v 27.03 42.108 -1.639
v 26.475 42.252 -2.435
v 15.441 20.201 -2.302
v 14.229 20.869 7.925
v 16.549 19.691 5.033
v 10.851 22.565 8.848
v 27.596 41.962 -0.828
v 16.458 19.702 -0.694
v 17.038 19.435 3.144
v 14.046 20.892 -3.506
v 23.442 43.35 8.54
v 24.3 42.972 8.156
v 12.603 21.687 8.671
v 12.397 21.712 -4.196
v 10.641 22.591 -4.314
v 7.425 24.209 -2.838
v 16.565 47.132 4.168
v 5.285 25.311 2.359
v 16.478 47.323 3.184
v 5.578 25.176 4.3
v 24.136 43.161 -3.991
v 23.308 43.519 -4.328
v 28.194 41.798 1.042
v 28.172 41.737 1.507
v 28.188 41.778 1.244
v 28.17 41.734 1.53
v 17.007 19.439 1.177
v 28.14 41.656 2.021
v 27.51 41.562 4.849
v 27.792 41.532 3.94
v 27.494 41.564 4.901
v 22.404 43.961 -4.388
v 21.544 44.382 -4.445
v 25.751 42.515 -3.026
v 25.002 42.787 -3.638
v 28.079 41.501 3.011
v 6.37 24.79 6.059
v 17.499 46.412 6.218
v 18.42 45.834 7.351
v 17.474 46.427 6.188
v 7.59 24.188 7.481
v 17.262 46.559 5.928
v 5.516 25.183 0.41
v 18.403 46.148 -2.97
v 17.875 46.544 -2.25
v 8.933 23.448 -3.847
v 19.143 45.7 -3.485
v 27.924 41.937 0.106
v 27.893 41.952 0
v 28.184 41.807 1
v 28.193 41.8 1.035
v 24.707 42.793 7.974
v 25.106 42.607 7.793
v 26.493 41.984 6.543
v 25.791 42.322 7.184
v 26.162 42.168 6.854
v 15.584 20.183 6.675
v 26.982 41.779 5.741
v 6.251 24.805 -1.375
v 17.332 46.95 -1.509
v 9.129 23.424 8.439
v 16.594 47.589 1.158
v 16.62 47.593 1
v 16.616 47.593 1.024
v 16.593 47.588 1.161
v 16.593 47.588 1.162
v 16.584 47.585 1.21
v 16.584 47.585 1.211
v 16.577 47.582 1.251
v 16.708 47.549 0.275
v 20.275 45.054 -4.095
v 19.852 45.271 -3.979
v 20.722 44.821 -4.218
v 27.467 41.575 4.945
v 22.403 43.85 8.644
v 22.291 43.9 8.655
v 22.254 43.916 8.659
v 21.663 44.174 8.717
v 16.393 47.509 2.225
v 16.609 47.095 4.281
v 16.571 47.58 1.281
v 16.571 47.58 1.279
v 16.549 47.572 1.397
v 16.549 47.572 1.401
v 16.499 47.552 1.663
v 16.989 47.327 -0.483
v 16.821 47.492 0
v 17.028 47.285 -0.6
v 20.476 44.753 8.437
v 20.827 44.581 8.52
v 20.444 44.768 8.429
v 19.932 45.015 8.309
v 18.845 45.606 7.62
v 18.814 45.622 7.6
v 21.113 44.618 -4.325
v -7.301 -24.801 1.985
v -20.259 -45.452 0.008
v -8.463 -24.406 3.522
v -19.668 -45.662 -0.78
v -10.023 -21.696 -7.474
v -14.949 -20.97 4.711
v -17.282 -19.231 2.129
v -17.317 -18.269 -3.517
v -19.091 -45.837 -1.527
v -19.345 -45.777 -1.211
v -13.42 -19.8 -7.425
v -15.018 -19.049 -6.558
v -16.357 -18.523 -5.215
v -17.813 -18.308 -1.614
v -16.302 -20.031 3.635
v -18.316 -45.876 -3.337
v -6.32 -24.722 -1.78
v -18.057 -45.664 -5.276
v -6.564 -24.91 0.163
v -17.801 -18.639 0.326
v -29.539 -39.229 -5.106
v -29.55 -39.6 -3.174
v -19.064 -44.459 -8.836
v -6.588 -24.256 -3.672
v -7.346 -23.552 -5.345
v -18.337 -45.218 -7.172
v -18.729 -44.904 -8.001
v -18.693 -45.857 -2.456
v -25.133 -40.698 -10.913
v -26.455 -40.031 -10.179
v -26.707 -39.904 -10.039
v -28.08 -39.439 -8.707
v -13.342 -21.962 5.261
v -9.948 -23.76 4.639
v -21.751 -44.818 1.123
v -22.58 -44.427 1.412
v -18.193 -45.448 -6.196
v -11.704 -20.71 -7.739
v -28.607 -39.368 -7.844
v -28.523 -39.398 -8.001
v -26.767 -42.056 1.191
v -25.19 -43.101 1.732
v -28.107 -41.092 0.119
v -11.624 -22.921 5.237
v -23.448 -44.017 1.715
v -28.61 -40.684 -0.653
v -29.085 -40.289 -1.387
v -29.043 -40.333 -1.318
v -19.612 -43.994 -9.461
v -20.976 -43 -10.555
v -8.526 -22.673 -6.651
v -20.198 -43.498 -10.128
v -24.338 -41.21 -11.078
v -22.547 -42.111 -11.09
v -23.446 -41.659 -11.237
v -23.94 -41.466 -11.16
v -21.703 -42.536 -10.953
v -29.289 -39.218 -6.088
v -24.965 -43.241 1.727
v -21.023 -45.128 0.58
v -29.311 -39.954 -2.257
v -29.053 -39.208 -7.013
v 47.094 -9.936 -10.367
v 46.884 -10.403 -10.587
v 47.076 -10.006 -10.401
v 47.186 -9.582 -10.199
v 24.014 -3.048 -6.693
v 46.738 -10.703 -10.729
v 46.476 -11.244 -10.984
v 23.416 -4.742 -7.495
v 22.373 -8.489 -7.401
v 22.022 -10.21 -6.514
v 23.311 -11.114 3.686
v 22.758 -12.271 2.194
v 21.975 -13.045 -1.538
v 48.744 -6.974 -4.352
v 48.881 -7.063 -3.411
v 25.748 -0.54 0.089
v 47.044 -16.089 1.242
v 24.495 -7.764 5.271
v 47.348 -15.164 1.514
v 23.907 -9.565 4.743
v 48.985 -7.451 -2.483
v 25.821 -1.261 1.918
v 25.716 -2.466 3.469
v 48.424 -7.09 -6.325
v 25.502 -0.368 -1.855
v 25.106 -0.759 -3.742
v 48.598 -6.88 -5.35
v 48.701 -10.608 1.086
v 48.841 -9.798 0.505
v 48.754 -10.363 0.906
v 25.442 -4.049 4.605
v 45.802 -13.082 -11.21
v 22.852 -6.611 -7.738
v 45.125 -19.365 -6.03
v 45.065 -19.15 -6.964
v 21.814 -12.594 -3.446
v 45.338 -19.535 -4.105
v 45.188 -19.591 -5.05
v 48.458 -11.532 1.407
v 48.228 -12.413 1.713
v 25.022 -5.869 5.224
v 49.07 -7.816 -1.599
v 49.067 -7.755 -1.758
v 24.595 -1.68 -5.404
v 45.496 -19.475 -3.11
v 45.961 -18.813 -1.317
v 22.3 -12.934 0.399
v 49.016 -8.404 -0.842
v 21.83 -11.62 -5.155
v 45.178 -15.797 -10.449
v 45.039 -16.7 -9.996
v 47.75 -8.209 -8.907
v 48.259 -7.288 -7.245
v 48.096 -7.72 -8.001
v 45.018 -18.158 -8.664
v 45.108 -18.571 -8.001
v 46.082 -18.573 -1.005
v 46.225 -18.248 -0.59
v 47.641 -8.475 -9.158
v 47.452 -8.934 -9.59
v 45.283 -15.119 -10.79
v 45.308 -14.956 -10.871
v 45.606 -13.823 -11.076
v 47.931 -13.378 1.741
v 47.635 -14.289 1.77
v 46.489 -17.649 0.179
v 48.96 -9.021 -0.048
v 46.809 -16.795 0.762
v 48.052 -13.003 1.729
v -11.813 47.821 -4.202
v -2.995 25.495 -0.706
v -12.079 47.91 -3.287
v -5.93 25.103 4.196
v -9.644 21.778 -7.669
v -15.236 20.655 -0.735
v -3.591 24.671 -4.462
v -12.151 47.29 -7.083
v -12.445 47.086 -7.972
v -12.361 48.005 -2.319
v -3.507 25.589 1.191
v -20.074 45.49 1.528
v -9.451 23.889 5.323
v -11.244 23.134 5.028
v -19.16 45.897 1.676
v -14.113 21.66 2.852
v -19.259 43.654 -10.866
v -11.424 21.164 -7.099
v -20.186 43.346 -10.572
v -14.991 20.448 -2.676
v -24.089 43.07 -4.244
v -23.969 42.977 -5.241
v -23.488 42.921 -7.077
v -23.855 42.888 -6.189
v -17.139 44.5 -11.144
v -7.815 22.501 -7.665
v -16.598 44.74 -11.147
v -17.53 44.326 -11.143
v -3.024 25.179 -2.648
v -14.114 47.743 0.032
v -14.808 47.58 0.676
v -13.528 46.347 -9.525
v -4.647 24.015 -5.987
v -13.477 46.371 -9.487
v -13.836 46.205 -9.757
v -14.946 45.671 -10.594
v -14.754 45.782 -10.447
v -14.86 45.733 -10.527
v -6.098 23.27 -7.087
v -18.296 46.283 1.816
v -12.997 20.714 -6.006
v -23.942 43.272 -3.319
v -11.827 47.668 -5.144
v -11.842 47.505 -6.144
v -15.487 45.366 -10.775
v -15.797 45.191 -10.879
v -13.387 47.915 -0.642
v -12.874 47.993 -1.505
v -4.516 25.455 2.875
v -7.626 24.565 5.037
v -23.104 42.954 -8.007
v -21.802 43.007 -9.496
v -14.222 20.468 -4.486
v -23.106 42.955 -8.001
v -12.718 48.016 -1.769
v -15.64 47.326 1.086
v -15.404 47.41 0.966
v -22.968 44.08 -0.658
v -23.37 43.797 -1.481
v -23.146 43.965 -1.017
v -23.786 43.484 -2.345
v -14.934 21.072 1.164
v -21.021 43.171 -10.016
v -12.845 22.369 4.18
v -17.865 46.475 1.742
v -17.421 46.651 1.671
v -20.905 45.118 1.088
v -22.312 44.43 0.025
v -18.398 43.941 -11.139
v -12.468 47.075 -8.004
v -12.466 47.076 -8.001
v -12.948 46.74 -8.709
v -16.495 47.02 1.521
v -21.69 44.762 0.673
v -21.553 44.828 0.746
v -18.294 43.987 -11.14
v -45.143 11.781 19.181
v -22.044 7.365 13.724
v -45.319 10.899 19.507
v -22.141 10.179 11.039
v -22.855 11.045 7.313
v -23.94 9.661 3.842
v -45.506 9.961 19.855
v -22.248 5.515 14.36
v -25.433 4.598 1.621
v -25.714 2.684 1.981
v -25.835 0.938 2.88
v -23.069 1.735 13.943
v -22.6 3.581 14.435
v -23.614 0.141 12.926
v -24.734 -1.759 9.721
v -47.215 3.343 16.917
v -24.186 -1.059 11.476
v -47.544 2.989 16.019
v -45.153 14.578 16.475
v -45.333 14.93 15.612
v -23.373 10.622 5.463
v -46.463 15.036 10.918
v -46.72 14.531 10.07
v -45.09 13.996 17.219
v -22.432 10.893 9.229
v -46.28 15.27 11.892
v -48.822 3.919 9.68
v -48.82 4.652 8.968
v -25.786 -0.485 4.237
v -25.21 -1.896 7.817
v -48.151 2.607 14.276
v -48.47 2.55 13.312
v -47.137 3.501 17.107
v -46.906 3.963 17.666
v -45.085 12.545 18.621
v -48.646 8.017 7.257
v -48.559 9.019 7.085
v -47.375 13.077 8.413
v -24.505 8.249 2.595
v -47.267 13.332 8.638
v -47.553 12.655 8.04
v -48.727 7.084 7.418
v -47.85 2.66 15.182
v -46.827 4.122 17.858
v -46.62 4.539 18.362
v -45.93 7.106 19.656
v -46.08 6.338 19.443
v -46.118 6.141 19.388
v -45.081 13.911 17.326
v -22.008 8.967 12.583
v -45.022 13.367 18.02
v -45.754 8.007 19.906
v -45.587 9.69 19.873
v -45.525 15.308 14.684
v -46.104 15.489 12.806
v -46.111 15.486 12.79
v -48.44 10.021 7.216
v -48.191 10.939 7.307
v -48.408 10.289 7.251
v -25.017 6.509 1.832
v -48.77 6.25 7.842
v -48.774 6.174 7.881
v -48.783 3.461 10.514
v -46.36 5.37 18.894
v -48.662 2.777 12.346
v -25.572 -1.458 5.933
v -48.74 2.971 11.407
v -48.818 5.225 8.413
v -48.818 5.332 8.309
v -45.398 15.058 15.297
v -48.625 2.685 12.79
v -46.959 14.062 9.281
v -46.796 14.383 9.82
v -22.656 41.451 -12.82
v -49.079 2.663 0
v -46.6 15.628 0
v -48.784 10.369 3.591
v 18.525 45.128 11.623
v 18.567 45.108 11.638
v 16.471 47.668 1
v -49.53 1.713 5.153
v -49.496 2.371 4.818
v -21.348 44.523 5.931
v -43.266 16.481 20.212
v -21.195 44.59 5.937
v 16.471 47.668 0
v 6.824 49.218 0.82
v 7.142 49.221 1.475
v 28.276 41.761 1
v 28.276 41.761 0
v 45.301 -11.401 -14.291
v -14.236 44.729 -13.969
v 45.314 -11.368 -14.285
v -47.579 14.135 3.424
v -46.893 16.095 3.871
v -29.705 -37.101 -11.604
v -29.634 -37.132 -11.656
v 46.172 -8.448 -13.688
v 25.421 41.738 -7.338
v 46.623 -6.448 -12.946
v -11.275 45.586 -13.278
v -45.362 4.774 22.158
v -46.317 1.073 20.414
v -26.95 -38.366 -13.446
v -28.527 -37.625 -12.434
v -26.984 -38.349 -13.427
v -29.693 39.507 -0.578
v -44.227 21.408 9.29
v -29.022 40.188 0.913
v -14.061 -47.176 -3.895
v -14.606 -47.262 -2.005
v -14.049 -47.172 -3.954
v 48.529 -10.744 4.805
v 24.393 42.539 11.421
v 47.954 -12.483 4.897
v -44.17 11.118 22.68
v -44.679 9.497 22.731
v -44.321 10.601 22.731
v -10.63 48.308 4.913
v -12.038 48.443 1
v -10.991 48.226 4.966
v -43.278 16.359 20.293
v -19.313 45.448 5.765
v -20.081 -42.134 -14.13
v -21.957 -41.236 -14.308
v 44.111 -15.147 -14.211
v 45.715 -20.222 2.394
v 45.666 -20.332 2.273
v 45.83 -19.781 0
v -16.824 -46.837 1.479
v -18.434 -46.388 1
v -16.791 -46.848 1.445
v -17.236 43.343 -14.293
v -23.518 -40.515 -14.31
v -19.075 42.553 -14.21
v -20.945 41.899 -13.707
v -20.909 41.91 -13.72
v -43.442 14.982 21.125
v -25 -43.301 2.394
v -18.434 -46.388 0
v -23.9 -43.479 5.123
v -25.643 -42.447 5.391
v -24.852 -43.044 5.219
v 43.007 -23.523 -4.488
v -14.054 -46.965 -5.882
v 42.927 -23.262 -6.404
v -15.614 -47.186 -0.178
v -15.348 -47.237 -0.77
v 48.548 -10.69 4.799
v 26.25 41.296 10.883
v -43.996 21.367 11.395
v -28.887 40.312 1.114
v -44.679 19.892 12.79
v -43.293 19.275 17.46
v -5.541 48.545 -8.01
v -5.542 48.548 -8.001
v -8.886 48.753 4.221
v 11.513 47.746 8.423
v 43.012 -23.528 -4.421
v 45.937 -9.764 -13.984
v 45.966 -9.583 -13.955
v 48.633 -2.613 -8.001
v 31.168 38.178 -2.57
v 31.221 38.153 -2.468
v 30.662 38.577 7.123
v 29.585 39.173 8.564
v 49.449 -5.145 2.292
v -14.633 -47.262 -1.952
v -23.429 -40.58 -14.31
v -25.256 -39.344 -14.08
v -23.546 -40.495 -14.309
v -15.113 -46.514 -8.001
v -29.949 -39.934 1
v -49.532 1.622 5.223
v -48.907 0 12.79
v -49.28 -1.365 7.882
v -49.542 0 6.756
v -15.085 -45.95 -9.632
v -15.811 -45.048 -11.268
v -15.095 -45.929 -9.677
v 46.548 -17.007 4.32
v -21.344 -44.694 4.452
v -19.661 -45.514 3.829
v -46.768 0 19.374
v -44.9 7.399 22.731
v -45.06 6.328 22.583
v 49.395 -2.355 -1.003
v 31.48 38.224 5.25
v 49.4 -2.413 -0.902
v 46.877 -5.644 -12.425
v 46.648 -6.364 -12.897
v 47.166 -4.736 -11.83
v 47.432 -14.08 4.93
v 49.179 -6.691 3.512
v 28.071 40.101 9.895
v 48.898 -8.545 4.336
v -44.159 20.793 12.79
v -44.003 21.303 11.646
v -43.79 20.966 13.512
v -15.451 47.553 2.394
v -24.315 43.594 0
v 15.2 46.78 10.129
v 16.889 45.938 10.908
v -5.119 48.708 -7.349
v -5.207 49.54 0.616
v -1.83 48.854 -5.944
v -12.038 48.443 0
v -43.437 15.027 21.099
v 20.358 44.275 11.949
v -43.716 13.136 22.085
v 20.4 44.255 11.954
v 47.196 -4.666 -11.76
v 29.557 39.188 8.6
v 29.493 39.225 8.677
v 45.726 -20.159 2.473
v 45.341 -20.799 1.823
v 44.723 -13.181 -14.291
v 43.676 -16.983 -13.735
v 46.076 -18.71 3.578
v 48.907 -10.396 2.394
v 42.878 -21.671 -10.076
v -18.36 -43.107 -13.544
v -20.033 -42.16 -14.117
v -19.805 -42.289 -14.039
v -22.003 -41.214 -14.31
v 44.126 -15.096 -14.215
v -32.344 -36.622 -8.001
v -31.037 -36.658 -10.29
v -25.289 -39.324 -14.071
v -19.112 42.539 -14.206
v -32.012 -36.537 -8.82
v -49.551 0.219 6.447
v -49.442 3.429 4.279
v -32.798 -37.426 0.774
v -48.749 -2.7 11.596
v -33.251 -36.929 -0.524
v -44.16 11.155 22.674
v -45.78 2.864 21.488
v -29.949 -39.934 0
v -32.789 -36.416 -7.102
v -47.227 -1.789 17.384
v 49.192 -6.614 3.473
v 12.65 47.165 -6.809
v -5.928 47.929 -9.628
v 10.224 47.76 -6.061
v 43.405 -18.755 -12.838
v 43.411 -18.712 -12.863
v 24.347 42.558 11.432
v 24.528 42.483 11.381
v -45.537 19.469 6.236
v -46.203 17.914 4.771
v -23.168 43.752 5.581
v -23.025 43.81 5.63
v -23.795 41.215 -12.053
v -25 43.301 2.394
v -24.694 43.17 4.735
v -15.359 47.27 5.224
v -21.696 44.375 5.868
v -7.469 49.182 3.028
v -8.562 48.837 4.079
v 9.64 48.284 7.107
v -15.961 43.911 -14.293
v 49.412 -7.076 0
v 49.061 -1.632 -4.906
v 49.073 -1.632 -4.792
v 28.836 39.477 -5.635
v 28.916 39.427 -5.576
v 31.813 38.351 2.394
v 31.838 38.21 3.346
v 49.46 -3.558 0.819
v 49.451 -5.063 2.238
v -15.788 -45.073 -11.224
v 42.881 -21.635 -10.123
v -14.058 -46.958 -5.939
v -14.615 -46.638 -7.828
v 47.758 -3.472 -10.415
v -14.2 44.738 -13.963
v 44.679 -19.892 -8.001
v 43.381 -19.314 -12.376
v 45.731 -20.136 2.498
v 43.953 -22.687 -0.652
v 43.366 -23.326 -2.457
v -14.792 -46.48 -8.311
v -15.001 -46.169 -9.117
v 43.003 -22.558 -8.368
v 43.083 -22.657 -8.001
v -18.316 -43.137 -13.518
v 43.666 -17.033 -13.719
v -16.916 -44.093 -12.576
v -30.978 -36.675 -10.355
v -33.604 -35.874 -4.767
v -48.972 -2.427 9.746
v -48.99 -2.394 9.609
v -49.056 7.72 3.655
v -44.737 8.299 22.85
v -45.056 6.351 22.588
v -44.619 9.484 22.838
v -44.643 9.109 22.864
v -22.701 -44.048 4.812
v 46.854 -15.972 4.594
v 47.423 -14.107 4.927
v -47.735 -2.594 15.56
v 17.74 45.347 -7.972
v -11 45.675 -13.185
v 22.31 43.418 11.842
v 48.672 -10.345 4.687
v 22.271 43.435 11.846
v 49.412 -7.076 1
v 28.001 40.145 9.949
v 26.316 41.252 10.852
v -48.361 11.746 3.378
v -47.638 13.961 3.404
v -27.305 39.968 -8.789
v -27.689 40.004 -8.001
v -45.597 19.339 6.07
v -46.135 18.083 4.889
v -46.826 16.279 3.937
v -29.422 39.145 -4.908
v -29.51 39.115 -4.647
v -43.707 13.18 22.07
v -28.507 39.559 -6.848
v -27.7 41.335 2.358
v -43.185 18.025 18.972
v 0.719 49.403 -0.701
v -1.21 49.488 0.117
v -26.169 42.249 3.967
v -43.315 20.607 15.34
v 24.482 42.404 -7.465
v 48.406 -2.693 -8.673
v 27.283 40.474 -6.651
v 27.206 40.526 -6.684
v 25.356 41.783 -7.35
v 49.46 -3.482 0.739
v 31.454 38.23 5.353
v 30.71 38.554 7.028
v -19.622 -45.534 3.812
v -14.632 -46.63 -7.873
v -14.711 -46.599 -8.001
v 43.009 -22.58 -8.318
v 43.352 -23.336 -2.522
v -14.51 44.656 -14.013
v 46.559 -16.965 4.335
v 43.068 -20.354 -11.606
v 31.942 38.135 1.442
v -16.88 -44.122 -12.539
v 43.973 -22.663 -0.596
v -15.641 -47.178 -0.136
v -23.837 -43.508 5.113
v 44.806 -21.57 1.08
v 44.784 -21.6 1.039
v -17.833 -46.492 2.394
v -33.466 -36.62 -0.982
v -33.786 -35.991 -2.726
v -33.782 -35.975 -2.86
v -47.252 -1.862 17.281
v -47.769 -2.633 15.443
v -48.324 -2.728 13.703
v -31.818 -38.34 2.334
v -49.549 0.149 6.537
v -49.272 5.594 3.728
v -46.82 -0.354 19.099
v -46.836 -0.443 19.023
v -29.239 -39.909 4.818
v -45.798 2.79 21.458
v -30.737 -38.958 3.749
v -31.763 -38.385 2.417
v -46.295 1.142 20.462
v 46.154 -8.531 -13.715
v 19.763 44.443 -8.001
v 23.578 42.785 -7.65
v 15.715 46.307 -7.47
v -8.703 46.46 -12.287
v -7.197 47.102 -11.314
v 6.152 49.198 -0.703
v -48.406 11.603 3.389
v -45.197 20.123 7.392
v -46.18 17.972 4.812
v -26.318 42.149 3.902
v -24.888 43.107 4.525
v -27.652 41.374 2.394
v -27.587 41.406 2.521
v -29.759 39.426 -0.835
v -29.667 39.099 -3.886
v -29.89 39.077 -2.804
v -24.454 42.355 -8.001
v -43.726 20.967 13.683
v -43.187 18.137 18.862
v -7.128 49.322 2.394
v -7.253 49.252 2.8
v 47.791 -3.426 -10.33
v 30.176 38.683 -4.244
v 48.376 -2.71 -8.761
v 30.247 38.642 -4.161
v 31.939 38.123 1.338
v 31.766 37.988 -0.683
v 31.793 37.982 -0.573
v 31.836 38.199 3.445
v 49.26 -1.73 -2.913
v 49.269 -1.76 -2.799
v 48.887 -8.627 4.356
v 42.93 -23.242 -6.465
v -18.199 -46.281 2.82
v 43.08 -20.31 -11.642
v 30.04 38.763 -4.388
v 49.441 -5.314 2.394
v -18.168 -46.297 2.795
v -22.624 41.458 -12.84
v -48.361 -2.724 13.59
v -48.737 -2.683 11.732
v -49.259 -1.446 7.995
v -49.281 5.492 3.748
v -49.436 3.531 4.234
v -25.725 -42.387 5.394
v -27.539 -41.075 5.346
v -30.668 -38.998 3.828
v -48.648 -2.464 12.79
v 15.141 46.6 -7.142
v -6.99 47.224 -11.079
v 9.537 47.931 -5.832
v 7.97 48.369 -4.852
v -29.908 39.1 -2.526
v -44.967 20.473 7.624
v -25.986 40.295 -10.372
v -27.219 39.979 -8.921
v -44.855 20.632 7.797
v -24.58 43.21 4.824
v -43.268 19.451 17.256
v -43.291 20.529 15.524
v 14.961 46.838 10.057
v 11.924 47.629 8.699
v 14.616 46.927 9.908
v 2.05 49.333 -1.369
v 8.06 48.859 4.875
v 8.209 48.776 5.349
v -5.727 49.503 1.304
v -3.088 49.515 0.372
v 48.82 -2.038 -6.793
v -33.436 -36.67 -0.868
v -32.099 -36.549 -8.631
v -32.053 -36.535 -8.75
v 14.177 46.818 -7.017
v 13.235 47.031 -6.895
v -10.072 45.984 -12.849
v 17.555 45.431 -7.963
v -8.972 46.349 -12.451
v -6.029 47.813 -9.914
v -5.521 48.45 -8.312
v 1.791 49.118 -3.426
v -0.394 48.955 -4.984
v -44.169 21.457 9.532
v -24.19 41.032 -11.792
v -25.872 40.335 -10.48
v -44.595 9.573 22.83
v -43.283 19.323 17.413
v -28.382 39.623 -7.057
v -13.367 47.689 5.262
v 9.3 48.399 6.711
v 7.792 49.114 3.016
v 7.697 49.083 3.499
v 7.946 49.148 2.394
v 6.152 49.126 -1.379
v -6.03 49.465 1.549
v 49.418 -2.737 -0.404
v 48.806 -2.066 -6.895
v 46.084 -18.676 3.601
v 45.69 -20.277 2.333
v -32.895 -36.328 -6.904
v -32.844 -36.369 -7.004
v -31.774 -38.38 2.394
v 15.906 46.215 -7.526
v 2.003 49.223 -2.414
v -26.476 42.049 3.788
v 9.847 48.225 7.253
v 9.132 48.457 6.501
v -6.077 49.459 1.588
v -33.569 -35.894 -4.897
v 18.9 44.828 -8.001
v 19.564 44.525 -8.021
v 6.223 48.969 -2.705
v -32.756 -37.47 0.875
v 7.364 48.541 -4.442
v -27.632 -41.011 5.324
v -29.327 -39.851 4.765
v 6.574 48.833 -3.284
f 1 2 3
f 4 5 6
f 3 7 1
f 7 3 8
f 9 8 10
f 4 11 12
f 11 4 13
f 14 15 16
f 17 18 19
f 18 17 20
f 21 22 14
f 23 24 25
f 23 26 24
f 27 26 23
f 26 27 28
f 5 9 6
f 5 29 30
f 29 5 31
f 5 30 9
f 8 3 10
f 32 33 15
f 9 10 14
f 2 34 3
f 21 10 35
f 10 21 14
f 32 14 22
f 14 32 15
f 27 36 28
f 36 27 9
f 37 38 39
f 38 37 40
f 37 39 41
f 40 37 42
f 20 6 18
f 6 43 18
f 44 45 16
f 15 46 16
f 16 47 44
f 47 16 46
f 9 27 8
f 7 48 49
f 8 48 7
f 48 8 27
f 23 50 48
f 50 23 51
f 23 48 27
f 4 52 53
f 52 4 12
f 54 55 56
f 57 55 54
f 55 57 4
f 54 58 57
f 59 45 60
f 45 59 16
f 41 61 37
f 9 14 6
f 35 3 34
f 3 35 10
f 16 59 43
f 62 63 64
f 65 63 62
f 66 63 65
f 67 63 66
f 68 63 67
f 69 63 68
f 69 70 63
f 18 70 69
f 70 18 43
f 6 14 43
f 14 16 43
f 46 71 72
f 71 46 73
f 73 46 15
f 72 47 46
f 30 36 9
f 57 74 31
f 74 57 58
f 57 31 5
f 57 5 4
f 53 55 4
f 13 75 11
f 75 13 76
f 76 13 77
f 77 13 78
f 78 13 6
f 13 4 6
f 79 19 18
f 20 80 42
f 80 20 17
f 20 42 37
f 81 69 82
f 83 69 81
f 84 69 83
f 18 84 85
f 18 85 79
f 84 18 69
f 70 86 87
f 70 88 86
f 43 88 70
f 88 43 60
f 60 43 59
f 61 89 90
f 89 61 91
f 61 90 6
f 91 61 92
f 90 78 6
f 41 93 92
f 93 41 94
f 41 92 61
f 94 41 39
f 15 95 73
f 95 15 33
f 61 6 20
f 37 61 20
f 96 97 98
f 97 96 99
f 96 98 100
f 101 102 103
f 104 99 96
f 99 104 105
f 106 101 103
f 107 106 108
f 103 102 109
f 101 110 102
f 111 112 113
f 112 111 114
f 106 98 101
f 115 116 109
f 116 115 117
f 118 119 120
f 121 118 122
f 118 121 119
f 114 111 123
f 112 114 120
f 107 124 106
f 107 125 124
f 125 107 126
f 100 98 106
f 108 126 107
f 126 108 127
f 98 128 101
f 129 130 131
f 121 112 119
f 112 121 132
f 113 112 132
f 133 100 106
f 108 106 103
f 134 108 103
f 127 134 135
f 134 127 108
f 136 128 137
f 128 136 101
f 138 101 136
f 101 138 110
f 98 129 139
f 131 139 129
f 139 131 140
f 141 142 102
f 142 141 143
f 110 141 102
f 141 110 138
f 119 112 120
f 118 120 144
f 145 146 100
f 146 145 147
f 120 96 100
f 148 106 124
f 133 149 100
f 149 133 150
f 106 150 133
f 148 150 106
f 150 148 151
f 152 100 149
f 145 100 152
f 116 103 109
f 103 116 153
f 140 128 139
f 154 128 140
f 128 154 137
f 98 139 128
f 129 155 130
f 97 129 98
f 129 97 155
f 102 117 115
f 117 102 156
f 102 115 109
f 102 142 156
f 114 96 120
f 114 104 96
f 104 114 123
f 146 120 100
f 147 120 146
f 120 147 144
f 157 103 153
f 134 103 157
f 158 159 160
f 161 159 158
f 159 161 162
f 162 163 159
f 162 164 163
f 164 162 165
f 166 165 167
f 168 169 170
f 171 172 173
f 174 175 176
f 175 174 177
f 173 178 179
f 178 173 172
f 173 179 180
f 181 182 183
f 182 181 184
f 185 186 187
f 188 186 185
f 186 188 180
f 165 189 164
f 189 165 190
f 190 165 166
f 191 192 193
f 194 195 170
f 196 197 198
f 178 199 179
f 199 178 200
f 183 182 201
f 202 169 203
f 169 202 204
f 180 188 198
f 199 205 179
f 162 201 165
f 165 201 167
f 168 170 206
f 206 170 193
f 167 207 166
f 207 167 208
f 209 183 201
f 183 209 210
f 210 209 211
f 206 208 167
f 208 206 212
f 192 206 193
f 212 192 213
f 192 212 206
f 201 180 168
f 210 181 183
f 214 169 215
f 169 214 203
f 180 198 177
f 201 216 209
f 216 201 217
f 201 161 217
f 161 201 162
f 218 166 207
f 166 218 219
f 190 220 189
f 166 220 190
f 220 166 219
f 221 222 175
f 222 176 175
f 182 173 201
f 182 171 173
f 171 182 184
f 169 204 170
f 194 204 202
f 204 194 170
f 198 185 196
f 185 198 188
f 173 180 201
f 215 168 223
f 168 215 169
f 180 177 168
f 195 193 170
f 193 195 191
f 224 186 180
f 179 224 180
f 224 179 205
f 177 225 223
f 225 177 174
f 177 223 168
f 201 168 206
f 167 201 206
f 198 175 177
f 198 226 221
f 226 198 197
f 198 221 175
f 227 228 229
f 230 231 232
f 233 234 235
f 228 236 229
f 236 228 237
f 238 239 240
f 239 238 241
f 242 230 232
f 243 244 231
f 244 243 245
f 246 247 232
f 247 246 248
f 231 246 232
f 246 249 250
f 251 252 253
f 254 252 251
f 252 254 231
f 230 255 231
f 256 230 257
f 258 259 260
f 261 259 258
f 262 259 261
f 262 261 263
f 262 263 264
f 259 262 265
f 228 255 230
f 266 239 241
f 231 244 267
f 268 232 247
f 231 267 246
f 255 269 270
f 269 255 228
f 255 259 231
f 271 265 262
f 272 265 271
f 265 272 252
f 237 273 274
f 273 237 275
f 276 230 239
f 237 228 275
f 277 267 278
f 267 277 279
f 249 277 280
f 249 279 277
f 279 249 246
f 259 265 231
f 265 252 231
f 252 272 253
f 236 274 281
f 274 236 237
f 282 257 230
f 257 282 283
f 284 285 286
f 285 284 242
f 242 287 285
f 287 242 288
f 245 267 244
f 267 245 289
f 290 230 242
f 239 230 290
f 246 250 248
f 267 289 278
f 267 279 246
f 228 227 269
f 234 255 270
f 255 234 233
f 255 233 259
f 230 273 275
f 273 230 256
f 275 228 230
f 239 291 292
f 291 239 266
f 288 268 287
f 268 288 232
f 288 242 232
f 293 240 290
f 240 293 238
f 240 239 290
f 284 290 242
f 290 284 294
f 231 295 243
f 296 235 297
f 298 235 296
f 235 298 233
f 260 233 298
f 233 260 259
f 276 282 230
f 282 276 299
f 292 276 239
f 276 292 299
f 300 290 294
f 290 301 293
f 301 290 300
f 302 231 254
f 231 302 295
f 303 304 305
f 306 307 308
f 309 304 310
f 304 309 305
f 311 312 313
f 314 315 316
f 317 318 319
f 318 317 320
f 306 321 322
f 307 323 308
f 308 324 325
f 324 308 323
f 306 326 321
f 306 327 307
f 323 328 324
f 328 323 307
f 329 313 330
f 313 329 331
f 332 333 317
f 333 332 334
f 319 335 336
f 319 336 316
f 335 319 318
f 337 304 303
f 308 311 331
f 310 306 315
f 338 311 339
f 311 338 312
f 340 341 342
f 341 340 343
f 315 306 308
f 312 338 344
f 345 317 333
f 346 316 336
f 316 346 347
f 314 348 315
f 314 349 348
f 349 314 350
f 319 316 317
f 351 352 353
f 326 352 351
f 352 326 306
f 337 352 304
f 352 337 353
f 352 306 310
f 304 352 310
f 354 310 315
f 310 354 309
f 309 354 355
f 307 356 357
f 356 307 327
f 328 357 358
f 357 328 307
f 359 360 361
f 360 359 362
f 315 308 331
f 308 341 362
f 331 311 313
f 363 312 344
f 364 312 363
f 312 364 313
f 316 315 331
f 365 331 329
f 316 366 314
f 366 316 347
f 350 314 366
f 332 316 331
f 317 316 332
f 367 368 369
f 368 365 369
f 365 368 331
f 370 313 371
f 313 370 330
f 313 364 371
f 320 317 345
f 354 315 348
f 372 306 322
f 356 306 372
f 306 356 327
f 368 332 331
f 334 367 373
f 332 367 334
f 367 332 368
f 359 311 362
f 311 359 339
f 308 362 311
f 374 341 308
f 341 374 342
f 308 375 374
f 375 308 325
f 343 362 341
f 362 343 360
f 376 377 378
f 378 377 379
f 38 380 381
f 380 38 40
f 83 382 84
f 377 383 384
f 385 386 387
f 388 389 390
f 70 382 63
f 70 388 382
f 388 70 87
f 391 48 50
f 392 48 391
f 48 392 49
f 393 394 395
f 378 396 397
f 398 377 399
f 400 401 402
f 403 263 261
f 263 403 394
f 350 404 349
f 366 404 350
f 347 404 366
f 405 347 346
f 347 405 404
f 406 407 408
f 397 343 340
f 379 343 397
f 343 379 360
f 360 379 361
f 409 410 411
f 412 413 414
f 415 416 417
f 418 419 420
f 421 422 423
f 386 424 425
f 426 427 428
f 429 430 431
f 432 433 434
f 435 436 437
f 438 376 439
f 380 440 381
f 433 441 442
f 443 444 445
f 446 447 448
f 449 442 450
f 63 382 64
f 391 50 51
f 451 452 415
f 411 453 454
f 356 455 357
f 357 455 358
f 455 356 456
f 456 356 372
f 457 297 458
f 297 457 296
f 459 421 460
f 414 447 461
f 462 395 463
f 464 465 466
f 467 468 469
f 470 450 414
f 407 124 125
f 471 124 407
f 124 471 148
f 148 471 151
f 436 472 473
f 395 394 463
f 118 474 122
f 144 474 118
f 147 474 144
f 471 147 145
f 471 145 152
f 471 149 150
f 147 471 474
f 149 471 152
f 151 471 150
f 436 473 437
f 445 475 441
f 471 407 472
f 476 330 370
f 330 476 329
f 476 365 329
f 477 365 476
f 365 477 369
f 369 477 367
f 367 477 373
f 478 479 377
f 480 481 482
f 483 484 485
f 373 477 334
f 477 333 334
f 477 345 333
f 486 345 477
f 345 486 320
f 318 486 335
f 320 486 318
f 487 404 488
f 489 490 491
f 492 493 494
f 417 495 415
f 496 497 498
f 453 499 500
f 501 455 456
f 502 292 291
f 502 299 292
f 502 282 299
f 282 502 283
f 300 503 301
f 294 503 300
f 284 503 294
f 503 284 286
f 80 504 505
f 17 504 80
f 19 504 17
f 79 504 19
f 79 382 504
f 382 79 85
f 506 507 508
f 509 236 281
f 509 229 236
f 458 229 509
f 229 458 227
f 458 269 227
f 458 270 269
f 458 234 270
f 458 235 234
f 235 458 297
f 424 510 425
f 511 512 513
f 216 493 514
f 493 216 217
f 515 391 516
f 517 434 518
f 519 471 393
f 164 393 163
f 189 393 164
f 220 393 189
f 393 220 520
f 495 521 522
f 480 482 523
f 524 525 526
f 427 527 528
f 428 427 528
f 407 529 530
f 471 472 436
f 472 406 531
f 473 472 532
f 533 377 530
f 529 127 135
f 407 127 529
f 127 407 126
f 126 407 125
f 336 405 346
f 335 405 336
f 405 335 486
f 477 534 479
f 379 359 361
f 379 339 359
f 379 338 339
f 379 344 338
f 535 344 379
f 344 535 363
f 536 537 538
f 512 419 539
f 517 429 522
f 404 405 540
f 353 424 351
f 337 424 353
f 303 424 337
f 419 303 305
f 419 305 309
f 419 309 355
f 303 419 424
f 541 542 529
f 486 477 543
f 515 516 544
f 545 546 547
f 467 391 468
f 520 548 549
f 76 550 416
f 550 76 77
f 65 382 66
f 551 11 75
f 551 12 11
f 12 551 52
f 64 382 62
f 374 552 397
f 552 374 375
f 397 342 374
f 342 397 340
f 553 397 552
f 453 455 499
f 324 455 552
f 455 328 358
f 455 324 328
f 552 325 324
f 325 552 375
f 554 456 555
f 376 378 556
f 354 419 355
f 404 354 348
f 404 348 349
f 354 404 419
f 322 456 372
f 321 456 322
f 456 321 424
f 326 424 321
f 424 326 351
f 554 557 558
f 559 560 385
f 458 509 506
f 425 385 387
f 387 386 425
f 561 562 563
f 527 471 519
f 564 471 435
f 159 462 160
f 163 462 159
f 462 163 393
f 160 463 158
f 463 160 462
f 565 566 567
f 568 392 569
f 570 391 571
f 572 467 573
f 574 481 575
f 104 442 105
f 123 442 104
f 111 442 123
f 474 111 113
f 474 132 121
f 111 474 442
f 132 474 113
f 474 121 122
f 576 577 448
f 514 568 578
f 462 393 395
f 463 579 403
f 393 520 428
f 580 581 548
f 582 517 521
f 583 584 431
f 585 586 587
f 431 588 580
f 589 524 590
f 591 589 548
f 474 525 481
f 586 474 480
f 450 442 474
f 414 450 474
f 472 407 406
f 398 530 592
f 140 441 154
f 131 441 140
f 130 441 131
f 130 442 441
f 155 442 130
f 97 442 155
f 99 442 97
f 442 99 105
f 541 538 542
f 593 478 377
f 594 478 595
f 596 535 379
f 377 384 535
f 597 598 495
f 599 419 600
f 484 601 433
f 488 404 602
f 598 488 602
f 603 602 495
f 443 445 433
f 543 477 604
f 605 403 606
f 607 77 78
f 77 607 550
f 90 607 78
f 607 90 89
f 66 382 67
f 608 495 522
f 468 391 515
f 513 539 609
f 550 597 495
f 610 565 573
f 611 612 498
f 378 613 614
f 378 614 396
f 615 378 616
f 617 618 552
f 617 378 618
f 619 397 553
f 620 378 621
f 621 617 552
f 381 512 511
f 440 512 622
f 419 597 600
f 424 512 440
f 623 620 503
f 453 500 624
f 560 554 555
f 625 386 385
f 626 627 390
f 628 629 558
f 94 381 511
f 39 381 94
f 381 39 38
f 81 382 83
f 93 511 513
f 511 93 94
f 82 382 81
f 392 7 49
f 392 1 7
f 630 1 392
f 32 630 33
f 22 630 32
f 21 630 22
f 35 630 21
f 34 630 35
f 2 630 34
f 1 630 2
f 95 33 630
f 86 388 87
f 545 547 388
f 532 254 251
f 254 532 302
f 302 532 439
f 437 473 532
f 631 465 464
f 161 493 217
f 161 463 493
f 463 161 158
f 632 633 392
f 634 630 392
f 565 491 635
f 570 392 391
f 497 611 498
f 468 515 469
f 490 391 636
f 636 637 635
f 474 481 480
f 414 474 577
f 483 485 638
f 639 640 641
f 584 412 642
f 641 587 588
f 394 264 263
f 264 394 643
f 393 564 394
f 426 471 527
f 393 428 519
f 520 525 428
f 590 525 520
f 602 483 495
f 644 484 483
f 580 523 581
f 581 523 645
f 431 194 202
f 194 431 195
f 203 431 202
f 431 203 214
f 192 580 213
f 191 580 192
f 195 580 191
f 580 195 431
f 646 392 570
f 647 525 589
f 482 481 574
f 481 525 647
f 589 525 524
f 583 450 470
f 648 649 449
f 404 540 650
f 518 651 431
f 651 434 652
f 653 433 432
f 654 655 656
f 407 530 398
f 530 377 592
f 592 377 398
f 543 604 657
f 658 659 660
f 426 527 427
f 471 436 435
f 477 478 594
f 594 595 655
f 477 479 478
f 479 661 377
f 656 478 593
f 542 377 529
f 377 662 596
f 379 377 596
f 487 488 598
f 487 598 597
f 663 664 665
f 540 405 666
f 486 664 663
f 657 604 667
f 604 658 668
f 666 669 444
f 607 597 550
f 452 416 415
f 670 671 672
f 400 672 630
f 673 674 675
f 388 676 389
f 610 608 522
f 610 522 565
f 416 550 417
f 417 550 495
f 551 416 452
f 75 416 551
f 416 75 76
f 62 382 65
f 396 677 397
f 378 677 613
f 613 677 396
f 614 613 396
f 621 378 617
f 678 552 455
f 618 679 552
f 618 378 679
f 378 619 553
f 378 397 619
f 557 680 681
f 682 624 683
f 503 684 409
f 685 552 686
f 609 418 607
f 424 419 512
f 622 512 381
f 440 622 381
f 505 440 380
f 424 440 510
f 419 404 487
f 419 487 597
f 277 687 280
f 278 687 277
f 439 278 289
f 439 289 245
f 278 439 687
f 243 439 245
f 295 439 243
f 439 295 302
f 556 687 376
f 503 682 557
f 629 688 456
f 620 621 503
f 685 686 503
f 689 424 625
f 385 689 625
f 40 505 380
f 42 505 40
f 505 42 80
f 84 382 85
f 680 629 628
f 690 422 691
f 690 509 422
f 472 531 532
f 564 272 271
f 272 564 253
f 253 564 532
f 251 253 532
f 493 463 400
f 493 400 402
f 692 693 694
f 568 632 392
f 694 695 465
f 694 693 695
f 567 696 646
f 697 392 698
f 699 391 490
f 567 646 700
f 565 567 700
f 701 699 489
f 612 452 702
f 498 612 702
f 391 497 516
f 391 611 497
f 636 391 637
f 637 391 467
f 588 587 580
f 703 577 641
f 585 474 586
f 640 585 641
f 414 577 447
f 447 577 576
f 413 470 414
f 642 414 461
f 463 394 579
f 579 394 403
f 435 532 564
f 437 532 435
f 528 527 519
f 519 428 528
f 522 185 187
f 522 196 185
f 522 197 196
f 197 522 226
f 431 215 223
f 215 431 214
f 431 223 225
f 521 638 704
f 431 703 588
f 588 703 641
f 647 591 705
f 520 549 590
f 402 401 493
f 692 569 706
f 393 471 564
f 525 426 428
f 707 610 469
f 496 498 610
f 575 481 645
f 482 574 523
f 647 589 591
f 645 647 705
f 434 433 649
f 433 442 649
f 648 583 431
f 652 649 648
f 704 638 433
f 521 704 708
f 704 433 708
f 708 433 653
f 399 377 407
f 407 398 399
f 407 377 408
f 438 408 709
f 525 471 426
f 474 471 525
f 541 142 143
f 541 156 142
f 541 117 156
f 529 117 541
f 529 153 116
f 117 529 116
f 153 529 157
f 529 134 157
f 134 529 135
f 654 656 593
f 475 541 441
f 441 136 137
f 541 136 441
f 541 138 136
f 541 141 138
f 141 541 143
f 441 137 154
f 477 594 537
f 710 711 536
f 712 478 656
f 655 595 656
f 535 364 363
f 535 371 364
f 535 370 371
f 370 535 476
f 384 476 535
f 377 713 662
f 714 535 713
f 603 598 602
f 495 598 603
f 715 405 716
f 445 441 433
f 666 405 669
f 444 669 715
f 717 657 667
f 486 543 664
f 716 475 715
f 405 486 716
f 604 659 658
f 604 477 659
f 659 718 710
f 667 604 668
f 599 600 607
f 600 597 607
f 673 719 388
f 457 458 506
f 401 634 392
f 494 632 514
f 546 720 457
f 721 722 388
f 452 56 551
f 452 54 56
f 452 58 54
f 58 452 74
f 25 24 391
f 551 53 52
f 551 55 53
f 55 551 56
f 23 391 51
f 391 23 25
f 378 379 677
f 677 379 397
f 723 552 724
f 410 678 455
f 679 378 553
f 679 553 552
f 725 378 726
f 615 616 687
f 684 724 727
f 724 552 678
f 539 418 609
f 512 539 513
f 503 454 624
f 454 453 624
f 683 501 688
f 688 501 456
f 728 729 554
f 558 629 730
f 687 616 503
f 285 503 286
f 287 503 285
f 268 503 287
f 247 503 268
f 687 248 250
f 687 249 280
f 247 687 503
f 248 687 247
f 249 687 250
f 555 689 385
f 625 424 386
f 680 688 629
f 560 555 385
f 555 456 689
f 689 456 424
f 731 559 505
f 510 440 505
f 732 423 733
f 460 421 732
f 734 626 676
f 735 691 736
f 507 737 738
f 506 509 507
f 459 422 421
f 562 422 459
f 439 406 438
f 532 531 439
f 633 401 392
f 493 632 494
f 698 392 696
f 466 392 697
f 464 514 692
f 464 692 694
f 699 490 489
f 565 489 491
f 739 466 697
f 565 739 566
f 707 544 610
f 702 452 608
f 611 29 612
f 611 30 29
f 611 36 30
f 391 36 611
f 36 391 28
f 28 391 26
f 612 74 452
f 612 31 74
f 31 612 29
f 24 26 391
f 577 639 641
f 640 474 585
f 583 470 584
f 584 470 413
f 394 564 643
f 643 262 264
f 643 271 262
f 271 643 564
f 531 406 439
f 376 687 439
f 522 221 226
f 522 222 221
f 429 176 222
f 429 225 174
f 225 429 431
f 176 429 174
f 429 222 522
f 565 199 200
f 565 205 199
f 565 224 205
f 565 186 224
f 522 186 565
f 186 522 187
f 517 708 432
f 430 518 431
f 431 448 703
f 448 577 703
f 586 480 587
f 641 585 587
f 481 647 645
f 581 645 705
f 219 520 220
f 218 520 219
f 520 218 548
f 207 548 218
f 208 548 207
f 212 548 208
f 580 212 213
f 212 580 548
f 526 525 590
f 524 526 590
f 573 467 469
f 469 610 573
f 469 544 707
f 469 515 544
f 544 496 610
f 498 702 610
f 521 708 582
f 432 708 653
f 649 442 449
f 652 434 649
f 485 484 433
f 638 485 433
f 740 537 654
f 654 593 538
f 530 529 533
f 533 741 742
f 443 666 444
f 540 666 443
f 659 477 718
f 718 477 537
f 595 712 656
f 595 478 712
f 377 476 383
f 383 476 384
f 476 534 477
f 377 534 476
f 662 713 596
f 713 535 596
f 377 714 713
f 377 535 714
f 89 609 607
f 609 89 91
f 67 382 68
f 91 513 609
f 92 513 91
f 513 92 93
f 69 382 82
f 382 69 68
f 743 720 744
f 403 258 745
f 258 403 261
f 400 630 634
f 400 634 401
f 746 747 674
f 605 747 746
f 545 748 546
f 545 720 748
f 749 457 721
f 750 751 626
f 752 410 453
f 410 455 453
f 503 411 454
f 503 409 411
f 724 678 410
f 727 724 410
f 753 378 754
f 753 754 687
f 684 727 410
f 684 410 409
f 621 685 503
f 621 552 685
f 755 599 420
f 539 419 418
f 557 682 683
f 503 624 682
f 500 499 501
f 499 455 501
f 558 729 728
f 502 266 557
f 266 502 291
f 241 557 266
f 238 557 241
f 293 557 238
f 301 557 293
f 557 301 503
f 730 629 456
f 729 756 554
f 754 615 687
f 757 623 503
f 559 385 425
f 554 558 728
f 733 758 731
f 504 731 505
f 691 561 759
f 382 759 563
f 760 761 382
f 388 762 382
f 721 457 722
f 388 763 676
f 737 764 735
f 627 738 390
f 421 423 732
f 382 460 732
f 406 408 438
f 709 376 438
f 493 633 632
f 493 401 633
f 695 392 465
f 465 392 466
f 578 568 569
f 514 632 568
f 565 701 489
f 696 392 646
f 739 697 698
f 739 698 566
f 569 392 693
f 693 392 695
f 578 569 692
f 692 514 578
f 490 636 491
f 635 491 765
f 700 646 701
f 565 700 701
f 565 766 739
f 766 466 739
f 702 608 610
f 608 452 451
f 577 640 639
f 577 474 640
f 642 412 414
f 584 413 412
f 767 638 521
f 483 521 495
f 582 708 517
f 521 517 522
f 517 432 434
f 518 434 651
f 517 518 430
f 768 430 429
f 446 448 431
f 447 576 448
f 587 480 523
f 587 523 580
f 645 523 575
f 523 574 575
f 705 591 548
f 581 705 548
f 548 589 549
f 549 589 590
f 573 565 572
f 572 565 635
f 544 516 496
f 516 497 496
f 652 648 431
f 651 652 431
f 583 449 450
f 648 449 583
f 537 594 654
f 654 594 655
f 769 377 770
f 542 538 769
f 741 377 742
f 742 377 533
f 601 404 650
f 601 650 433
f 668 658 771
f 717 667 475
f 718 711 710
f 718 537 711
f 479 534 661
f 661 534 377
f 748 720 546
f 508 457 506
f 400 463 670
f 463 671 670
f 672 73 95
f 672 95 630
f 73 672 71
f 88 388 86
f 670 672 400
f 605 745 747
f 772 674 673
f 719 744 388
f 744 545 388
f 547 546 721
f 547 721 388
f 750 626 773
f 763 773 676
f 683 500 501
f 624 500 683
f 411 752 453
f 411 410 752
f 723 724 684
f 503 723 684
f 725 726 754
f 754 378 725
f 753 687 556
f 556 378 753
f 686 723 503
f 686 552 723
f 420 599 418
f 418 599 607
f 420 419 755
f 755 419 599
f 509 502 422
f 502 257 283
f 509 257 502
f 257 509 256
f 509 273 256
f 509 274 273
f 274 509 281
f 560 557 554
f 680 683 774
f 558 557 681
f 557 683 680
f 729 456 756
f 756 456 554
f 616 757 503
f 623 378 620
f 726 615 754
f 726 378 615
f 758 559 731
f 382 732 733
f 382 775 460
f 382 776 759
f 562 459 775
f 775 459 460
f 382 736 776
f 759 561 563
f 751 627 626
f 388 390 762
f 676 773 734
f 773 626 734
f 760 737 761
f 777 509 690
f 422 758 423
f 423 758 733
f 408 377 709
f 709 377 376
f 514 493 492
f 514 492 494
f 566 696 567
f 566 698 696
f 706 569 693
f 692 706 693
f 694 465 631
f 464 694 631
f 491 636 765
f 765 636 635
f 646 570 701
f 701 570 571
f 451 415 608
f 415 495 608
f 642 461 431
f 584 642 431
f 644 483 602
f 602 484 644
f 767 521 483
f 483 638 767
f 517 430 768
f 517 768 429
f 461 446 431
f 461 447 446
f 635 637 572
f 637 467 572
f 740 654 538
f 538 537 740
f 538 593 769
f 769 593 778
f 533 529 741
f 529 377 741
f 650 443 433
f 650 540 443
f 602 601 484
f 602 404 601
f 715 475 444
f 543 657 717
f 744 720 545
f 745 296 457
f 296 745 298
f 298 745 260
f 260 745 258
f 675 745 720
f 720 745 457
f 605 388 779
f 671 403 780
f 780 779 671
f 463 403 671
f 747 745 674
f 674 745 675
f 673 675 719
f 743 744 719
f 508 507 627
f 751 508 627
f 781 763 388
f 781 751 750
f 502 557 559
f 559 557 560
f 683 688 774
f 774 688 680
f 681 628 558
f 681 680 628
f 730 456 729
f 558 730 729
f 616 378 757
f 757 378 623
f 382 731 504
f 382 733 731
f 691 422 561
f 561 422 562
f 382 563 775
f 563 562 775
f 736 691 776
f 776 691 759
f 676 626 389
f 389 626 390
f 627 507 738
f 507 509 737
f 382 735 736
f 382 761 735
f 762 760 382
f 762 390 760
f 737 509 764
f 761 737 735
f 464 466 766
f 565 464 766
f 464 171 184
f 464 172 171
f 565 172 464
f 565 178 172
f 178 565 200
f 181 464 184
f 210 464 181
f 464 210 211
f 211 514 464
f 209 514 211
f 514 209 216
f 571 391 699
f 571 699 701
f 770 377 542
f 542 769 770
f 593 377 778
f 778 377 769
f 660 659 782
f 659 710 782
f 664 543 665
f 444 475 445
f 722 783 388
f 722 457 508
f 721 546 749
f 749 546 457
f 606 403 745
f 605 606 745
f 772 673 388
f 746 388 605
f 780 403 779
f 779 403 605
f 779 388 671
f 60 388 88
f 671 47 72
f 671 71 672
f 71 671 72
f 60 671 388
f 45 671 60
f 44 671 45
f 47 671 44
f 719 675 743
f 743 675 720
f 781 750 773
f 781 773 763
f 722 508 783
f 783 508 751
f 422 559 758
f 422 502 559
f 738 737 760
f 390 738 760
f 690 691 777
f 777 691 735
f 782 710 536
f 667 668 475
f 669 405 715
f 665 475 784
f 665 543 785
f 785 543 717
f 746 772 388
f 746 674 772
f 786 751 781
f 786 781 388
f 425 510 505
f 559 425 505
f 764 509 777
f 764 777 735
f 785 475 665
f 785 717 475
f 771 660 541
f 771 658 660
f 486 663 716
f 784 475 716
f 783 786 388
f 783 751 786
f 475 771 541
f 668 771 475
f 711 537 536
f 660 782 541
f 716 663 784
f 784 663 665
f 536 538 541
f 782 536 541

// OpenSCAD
difference() {
	hull() {
		union() {
			union() {
				rotate(a = 63.4182116661, v = [0, 0, 1]) {
					translate(v = [0, -6.6000000000, 0]) {
						cube(size = [49.9992719913, 13.2000000000, 1]);
					}
				}
				rotate(a = -119.2701451512, v = [0, 0, 1]) {
					translate(v = [0, -6.6000000000, 0]) {
						cube(size = [49.4780420303, 13.2000000000, 1]);
					}
				}
				rotate(a = -15.7474783395, v = [0, 0, 1]) {
					translate(v = [0, -6.6000000000, 0]) {
						cube(size = [49.4780435092, 13.2000000000, 1]);
					}
				}
				rotate(a = 111.5527096340, v = [0, 0, 1]) {
					translate(v = [0, -6.6000000000, 0]) {
						cube(size = [49.4780434167, 13.2000000000, 1]);
					}
				}
				rotate(a = 169.1775781374, v = [0, 0, 1]) {
					translate(v = [0, -6.6000000000, 0]) {
						cube(size = [48.7058762669, 13.2000000000, 1]);
					}
				}
			}
			translate(v = [0, 0, 2.3943251146]) {
				intersection() {
					hull() {
						rotate(a = 90.3091102811, v = [-0.8942834978, 0.4474683452, 0.0000004468]) {
							cylinder(h = 50, r = 9.6000000000);
						}
						rotate(a = 98.2861542465, v = [0.8632176793, -0.4838238390, -0.0000003794]) {
							cylinder(h = 50, r = 9.6000000000);
						}
						rotate(a = 98.2860248982, v = [0.2685647867, 0.9524200062, -0.0000012210]) {
							cylinder(h = 50, r = 9.6000000000);
						}
						rotate(a = 98.2860329872, v = [-0.9203709255, -0.3635219830, 0.0000012839]) {
							cylinder(h = 50, r = 9.6000000000);
						}
						rotate(a = 76.9358785055, v = [-0.1829056368, -0.9567919476, 0.0000011397]) {
							cylinder(h = 50, r = 9.6000000000);
						}
					}
					sphere(r = 50);
				}
			}
		}
	}
	translate(v = [0, 0, 2.3943251146]) {
		rotate(a = 90.3091102811, v = [-0.8942834978, 0.4474683452, 0.0000004468]) {
			translate(v = [0, 0, 25]) {
				cylinder(h = 50, r = 6.6000000000);
			}
		}
		rotate(a = 98.2861542465, v = [0.8632176793, -0.4838238390, -0.0000003794]) {
			translate(v = [0, 0, 25]) {
				cylinder(h = 50, r = 6.6000000000);
			}
		}
		rotate(a = 98.2860248982, v = [0.2685647867, 0.9524200062, -0.0000012210]) {
			translate(v = [0, 0, 25]) {
				cylinder(h = 50, r = 6.6000000000);
			}
		}
		rotate(a = 98.2860329872, v = [-0.9203709255, -0.3635219830, 0.0000012839]) {
			translate(v = [0, 0, 25]) {
				cylinder(h = 50, r = 6.6000000000);
			}
		}
		rotate(a = 76.9358785055, v = [-0.1829056368, -0.9567919476, 0.0000011397]) {
			translate(v = [0, 0, 25]) {
				cylinder(h = 50, r = 6.6000000000);
			}
		}
	}
}
